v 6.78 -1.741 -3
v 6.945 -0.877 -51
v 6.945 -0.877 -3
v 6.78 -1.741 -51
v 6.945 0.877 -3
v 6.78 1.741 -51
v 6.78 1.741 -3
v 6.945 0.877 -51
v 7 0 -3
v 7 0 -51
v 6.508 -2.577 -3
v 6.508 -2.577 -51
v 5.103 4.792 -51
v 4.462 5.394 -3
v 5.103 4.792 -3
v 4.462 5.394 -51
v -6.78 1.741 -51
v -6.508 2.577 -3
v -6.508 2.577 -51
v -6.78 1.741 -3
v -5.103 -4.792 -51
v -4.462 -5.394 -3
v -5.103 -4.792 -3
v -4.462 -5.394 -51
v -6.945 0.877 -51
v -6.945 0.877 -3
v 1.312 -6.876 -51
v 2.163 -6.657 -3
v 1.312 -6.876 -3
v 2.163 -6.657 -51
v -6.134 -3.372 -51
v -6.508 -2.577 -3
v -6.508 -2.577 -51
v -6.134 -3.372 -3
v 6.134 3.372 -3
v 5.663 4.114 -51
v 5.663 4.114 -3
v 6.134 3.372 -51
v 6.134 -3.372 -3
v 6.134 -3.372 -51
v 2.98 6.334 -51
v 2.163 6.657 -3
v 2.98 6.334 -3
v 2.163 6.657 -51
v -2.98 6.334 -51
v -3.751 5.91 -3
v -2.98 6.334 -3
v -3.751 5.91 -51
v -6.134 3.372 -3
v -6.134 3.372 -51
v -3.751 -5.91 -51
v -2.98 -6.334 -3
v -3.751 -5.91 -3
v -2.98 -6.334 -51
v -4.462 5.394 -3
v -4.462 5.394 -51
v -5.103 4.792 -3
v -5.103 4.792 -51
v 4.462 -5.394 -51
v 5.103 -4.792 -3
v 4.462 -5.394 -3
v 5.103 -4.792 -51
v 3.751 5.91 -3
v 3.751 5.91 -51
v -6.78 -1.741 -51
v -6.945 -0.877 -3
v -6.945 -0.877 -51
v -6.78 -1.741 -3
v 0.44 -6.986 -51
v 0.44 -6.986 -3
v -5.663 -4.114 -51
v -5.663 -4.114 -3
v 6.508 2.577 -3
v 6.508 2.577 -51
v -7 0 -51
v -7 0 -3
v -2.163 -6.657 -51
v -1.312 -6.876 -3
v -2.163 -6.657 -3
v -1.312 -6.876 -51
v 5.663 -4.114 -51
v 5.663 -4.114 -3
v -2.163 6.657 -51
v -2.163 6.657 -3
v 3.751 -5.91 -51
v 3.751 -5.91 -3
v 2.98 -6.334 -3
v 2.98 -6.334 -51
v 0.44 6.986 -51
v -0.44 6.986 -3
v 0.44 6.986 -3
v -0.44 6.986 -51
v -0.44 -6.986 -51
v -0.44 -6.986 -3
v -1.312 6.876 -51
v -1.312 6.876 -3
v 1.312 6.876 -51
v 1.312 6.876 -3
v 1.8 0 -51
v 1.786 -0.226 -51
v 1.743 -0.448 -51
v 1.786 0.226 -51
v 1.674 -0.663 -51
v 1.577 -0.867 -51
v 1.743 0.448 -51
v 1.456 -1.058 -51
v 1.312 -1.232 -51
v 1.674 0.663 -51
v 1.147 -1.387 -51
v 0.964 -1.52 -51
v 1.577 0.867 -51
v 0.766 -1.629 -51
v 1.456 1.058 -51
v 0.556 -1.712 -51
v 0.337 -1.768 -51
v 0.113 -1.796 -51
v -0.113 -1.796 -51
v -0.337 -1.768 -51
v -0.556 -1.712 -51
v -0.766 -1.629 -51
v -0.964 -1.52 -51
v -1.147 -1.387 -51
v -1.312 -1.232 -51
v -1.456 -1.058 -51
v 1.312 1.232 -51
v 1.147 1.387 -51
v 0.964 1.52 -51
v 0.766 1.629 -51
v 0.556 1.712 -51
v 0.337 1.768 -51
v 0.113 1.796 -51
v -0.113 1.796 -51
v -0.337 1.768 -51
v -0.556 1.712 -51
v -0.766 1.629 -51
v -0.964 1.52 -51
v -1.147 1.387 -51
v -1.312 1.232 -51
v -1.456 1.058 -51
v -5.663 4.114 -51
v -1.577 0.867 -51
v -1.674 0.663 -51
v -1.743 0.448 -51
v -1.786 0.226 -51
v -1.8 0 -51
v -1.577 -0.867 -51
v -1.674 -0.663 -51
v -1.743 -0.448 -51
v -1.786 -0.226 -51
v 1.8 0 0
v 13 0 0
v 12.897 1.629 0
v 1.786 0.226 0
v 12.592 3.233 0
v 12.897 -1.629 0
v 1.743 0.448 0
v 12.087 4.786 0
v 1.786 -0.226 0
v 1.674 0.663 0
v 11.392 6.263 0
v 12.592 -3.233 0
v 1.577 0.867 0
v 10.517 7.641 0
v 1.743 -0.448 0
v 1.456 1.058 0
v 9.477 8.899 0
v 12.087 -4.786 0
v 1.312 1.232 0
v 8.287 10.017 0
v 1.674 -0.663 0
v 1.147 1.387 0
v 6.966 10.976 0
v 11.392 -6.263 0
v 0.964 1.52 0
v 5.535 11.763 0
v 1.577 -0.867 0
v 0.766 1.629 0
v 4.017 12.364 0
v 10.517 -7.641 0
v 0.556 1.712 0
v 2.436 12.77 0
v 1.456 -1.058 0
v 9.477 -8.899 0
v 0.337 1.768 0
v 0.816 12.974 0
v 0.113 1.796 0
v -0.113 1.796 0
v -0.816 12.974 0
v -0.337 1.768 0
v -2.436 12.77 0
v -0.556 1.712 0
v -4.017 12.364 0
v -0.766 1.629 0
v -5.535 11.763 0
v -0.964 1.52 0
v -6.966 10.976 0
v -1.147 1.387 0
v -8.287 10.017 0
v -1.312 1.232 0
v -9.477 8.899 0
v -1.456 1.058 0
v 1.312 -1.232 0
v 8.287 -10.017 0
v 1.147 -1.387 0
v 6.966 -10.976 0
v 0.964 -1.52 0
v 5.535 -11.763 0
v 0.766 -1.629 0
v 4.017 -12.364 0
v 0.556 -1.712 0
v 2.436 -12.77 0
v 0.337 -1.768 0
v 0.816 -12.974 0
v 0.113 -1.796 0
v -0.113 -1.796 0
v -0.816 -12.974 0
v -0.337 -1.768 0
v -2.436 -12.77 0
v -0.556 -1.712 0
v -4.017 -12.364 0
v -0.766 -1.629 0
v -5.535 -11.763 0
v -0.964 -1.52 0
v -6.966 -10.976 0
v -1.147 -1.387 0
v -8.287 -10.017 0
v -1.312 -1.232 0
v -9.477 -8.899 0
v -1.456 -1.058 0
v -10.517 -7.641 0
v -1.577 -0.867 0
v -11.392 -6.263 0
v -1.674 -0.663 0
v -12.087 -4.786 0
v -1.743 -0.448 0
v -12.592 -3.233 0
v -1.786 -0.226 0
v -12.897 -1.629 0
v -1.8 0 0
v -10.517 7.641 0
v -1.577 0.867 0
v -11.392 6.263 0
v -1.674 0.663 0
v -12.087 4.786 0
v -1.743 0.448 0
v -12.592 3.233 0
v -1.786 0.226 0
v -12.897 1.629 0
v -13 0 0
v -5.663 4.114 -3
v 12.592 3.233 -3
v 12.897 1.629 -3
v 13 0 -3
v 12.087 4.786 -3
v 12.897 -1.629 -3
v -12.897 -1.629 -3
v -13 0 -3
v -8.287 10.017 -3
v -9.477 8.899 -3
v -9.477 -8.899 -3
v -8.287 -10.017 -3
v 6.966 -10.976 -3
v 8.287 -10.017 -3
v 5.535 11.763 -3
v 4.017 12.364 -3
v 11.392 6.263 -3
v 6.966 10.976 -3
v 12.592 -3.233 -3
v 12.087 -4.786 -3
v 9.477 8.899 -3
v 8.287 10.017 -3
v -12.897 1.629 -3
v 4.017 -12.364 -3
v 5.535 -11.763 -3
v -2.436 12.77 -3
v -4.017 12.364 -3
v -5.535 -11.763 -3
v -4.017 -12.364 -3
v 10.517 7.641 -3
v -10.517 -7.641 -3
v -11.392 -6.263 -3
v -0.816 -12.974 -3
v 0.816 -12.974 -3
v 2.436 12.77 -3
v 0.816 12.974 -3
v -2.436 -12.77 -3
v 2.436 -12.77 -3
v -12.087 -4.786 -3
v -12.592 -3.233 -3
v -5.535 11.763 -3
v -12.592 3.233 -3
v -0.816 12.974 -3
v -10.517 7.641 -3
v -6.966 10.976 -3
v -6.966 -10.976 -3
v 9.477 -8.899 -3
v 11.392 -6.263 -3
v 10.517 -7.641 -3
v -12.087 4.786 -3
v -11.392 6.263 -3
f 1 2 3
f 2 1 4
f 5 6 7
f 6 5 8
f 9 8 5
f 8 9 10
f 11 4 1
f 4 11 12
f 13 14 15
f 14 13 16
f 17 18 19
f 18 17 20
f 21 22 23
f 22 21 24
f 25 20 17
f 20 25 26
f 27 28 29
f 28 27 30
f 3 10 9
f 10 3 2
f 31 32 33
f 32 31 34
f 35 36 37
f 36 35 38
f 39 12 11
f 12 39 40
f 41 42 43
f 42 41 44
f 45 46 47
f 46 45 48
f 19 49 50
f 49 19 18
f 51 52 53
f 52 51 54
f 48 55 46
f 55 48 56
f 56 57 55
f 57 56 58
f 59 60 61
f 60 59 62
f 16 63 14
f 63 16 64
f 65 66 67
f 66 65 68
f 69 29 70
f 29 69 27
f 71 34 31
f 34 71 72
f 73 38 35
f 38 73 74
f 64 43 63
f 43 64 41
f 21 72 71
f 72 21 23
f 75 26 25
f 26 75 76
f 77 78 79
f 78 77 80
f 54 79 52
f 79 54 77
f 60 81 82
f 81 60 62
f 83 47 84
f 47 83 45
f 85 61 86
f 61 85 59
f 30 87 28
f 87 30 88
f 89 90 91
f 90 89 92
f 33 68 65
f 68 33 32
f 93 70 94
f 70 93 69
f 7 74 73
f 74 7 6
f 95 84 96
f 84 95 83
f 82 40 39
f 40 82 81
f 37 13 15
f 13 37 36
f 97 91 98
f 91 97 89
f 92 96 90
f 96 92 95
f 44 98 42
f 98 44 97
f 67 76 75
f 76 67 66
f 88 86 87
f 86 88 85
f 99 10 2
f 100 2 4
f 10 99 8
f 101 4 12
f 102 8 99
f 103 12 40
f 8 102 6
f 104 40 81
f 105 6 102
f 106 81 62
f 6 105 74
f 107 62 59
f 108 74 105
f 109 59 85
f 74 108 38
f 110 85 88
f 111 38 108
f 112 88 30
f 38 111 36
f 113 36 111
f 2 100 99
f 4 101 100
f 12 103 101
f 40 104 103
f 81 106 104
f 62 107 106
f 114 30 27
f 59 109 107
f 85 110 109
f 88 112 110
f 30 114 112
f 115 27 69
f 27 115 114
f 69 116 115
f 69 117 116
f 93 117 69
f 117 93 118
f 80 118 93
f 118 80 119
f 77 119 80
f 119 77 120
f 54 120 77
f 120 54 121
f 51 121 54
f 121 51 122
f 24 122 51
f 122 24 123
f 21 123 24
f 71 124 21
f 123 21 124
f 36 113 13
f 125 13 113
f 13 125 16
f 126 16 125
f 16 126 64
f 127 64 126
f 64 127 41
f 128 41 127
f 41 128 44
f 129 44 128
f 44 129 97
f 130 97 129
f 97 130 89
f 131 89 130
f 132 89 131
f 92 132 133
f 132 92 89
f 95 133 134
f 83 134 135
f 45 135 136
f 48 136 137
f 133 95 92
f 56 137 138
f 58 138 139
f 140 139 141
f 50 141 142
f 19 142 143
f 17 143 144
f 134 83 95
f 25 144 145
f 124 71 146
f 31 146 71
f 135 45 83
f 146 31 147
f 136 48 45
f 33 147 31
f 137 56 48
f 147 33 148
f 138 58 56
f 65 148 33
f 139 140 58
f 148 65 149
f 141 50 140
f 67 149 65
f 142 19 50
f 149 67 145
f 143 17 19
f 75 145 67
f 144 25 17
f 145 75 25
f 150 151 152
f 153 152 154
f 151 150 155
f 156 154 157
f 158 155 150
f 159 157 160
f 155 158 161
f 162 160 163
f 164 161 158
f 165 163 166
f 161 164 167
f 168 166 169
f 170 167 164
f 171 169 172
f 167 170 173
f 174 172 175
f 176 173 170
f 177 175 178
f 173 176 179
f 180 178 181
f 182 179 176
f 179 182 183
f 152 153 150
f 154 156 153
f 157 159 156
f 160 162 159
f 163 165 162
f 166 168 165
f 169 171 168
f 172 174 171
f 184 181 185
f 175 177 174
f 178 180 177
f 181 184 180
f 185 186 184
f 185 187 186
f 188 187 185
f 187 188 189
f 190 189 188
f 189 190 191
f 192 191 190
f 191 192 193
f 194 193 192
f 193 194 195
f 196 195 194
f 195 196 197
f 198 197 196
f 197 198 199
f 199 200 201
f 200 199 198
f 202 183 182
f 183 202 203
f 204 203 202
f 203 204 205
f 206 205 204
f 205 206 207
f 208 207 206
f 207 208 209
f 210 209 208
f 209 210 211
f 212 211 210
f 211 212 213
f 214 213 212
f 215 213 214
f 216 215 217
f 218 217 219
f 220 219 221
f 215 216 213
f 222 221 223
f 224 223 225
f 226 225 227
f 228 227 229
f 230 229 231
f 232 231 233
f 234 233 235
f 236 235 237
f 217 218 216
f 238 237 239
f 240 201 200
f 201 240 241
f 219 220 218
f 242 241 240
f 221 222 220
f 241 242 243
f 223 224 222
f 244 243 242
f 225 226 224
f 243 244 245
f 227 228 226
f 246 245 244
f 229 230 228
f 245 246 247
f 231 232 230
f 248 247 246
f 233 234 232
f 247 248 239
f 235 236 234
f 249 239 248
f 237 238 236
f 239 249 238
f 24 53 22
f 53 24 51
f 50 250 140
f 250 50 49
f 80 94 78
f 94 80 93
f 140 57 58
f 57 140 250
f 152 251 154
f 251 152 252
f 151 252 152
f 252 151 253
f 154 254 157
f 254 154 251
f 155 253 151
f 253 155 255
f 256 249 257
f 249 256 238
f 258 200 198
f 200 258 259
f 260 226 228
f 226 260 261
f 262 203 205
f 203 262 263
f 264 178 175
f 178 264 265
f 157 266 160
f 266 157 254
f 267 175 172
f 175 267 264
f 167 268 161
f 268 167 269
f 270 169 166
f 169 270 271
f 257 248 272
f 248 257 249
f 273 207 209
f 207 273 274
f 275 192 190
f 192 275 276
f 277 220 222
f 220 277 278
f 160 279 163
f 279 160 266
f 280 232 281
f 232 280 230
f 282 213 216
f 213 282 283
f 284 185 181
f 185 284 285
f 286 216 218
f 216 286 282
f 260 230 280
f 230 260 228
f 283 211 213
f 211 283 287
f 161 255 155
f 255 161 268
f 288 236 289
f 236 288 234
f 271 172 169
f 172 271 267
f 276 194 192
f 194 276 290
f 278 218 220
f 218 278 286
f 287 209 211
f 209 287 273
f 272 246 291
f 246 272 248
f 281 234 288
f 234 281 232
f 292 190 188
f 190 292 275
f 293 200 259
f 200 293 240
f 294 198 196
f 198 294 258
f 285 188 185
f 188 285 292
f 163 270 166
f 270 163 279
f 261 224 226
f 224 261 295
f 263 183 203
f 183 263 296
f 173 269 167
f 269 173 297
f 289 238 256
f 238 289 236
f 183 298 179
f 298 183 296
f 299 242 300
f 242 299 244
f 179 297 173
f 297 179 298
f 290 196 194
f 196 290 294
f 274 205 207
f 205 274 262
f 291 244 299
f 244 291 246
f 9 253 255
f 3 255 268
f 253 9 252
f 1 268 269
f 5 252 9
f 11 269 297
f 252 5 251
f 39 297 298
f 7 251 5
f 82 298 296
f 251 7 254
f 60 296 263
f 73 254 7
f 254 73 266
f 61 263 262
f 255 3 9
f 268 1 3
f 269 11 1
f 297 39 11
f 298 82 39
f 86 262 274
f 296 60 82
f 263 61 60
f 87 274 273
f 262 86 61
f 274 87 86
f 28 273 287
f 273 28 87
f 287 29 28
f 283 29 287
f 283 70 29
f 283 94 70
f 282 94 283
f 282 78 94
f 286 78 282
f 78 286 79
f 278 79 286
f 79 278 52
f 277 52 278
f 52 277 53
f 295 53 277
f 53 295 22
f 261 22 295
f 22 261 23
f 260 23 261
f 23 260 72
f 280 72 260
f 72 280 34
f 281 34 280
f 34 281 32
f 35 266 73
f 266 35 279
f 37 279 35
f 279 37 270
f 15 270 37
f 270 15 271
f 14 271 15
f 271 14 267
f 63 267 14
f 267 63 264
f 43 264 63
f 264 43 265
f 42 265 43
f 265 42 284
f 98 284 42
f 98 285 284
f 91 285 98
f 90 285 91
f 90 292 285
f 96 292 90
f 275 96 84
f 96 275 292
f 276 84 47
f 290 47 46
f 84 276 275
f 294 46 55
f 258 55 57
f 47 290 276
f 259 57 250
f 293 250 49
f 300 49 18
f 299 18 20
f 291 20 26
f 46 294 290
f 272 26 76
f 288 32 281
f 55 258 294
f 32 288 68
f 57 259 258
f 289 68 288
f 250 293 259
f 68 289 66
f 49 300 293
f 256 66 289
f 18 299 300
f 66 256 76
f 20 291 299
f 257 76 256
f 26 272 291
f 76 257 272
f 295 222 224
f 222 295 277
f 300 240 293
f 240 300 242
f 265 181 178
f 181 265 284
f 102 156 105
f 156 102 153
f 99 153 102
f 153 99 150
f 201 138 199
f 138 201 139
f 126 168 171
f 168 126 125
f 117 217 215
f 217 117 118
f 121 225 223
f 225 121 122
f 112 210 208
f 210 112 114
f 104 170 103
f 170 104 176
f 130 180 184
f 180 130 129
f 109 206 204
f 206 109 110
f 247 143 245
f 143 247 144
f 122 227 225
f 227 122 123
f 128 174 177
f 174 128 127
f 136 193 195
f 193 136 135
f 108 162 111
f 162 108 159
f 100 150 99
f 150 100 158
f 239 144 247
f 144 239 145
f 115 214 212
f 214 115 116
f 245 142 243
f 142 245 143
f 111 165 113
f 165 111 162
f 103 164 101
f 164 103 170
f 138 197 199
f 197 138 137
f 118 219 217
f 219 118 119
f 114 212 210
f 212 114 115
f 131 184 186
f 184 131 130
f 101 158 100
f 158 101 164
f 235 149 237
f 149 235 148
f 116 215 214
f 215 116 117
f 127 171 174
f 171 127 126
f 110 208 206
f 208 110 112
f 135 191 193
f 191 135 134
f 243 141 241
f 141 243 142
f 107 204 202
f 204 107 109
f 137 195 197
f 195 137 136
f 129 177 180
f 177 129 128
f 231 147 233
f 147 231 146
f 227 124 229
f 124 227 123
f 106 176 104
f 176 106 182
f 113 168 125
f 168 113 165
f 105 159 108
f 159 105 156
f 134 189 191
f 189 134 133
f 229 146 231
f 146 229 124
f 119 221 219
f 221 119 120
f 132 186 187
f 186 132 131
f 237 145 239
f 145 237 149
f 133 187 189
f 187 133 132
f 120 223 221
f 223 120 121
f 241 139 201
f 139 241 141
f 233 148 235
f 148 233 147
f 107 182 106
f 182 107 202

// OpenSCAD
$fn = 50;


difference() {
	union() {
		translate(v = [0, 0, -51.0000000000]) {
			cylinder(h = 51, r = 7.0000000000);
		}
		translate(v = [0, 0, -3.0000000000]) {
			cylinder(h = 3, r = 13.0000000000);
		}
	}
	union() {
		#translate(v = [0, 0, -51]) {
			cylinder(h = 51, r = 1.8000000000);
		}
	}
}
